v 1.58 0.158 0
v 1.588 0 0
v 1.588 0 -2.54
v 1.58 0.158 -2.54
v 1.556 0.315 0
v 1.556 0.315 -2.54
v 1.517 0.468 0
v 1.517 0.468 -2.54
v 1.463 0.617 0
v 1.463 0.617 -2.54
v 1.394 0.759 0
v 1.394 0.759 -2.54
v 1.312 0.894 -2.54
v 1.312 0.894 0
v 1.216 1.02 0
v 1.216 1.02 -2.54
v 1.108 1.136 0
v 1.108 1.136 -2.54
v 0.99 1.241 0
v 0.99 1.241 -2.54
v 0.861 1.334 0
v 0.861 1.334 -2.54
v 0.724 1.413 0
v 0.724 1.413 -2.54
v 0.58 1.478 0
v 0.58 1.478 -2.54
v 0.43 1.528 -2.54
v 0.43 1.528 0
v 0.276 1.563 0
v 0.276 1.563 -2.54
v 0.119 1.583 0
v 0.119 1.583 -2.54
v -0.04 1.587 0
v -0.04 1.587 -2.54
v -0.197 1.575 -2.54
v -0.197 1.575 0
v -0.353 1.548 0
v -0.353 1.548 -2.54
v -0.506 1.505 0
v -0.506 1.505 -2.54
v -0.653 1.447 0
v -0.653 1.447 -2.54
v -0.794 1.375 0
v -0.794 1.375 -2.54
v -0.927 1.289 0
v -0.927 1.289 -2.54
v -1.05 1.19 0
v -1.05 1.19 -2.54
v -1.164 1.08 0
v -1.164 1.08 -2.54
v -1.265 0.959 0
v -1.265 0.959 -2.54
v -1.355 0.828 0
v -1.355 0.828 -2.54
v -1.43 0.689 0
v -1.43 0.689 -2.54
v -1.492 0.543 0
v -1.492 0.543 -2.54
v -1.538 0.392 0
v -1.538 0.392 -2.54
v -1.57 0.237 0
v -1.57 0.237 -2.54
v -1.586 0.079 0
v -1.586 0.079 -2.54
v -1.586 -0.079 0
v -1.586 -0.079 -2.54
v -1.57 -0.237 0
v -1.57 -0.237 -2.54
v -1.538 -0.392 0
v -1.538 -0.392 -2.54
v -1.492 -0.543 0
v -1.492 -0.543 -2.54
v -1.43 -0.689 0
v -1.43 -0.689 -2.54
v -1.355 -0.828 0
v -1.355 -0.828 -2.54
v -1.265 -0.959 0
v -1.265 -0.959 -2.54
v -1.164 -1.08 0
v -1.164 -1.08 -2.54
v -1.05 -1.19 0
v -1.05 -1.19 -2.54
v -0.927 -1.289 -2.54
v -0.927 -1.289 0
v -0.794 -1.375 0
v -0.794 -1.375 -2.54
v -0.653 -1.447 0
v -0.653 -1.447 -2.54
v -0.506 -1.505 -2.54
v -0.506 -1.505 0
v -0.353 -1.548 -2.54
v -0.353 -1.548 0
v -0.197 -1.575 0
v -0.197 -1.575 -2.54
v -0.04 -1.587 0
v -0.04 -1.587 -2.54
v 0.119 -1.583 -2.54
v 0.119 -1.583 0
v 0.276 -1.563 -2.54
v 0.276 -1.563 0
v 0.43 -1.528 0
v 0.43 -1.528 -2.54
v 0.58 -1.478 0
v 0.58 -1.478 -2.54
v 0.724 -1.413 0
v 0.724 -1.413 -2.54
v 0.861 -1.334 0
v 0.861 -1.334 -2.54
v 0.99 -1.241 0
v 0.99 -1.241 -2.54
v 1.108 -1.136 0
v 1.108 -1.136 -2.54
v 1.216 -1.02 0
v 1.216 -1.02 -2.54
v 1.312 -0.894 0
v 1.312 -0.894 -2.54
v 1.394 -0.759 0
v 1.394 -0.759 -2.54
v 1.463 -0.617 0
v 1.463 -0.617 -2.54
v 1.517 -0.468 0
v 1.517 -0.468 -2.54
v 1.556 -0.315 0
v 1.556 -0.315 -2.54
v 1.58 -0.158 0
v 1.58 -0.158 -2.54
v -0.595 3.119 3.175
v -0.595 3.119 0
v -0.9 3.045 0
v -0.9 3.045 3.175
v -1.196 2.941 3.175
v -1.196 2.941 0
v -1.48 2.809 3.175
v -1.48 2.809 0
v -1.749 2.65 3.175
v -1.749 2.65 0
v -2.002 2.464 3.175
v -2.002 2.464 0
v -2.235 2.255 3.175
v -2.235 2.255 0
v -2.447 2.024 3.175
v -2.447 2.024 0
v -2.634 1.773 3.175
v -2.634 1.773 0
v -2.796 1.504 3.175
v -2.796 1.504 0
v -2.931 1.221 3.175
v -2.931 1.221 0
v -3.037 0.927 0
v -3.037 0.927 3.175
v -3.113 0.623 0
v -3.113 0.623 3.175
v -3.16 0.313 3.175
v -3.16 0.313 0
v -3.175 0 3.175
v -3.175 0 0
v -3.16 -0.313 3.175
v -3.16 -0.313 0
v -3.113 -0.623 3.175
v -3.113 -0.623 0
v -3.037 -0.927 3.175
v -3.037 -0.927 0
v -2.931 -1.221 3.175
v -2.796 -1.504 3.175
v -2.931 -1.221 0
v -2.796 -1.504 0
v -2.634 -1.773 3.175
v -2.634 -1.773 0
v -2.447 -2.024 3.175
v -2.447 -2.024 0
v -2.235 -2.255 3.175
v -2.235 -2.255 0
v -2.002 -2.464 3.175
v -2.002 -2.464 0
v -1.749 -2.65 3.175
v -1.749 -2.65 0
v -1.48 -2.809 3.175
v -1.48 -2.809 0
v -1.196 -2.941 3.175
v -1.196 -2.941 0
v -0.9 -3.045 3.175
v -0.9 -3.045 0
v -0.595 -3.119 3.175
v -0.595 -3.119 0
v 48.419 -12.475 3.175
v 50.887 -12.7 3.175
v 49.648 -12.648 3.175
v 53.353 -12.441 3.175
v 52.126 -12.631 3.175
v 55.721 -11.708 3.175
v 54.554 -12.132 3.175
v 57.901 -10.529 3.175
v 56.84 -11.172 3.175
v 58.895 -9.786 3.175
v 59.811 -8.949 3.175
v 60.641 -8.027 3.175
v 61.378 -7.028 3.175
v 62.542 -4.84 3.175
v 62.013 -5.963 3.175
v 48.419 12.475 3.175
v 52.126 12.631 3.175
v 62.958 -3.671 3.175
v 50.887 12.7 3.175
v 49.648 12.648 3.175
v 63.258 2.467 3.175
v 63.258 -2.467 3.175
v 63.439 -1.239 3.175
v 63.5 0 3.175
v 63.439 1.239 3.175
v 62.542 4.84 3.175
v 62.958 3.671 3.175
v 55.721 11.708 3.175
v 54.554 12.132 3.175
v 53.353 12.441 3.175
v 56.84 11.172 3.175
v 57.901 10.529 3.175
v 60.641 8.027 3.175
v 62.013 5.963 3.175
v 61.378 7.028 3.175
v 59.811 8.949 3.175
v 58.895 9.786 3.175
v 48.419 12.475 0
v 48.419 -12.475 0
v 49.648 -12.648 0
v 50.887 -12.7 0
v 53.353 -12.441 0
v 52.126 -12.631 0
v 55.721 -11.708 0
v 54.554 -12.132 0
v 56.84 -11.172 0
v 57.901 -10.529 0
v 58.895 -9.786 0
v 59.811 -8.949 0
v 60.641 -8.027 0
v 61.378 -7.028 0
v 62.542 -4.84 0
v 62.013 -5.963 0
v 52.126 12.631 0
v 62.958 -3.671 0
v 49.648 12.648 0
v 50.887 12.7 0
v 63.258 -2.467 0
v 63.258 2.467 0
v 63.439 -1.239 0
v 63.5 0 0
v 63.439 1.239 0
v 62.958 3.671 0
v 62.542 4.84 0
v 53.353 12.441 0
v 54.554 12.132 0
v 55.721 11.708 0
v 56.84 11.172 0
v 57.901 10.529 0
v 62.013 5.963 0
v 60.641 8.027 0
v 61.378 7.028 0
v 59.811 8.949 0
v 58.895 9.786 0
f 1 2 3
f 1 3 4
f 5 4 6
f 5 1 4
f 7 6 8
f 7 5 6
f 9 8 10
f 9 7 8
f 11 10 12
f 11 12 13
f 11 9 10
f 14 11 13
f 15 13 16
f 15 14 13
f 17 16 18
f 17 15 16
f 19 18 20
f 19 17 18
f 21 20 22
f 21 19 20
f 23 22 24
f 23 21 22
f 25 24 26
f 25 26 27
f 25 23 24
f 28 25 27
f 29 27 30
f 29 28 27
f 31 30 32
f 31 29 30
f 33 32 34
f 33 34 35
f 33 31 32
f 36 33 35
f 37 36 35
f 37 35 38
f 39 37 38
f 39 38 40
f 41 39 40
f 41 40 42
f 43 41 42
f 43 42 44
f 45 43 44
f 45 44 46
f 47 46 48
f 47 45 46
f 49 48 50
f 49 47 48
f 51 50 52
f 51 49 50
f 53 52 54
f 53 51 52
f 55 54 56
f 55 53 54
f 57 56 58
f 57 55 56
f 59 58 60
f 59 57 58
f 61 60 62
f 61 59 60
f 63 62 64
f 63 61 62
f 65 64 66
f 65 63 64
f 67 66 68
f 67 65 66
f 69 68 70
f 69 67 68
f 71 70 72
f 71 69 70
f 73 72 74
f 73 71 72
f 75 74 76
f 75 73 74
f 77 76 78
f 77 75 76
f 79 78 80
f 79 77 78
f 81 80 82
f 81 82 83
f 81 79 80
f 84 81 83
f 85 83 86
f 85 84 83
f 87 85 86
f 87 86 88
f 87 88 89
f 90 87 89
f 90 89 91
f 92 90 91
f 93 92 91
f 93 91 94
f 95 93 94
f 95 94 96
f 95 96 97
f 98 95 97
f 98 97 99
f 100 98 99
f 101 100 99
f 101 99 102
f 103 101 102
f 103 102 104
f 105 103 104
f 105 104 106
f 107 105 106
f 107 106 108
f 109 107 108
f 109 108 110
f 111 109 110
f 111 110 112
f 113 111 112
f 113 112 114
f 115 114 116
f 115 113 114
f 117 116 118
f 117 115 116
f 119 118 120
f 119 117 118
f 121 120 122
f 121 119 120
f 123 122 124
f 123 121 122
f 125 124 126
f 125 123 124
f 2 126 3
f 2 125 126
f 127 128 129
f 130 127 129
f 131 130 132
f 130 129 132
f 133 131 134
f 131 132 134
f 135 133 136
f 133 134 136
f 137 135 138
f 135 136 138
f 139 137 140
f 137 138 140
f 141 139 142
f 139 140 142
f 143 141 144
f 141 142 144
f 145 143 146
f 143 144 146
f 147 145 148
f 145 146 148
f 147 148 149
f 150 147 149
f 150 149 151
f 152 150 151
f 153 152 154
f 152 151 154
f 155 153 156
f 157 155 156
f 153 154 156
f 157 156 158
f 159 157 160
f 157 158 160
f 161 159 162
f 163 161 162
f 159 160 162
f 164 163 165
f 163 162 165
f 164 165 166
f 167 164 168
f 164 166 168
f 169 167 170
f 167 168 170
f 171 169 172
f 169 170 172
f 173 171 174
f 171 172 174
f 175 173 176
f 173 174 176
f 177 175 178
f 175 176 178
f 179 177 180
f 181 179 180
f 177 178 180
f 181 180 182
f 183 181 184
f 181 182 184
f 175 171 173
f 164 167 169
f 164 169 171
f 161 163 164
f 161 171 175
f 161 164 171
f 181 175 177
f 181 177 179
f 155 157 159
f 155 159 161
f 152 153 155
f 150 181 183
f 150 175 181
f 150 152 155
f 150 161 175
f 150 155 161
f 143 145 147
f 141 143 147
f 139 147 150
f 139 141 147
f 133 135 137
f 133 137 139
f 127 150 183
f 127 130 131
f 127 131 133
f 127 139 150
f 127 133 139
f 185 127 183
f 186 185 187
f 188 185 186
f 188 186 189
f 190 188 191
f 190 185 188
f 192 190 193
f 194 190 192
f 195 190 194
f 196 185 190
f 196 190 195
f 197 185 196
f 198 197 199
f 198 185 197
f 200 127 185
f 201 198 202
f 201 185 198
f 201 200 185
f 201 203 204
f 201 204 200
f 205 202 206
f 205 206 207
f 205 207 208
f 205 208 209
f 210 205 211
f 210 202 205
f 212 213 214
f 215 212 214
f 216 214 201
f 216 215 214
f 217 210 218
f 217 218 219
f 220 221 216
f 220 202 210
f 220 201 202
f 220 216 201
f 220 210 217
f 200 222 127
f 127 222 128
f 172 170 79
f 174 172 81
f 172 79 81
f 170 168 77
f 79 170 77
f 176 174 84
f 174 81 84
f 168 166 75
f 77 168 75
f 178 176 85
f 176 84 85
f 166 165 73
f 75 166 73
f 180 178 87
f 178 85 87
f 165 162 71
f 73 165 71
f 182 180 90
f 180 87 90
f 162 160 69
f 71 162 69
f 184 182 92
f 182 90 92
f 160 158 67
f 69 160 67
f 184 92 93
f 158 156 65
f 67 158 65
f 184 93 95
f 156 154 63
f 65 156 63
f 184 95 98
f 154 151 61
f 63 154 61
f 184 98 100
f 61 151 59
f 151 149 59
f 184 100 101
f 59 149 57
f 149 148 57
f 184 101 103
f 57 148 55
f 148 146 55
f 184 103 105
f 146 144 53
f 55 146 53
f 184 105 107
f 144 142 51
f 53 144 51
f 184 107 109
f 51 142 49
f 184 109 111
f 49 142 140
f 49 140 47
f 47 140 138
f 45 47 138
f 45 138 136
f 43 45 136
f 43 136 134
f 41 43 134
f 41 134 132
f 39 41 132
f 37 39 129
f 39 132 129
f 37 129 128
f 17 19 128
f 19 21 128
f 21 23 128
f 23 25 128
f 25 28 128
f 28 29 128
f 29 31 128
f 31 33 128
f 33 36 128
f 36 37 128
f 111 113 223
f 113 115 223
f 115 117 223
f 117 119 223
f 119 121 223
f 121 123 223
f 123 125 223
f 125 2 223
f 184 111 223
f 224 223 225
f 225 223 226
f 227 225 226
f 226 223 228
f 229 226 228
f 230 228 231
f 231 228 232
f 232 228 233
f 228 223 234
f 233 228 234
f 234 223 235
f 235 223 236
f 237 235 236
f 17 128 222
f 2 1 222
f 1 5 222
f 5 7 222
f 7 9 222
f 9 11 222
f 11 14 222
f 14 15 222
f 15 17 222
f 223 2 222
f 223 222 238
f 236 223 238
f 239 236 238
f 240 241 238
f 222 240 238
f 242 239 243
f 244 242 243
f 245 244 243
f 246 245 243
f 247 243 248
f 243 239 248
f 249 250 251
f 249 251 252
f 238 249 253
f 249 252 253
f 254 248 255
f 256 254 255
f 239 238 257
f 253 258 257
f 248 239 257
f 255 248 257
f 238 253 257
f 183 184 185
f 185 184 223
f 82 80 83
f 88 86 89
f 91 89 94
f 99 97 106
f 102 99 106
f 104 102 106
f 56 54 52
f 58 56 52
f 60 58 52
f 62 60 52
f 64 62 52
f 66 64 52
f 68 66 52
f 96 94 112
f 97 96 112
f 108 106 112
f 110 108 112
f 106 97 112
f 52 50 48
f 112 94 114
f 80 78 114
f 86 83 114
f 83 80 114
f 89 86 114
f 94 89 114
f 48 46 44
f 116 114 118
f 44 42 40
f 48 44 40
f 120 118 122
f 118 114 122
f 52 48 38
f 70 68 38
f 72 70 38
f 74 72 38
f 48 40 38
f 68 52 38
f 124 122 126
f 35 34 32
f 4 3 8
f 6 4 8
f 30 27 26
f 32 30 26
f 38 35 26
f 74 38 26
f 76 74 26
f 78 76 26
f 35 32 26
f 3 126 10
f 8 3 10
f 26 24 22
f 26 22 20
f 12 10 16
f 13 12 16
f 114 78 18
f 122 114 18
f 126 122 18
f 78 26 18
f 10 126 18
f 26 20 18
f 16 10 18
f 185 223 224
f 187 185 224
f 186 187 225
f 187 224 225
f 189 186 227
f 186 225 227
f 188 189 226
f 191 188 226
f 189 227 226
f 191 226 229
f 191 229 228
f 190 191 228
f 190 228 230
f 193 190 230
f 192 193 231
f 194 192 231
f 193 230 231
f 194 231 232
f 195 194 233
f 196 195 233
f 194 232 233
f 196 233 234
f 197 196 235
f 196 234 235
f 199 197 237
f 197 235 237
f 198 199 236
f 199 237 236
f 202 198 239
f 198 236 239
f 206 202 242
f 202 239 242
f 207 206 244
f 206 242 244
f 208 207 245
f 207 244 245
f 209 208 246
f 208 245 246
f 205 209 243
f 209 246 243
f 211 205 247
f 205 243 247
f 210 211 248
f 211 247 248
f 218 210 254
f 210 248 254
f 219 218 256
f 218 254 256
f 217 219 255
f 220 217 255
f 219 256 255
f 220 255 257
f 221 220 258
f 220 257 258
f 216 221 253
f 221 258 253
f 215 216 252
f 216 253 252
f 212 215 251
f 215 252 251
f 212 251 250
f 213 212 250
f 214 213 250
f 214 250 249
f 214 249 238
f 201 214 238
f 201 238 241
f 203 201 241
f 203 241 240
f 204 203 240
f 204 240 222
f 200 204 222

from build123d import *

# Parameters (mm, degrees)
F0_R     = 1.5875
F1_DEPTH = 3.175
F2_DEPTH = 2.54


with BuildPart() as f1:
    # F0 (on Top) → F1 (new body)
    with BuildSketch(Plane.XY):
        with BuildLine():
            Line((48.41875, 12.47476), (-0.595312, 3.11869))
            ThreePointArc((-0.595312, 3.11869), (-3.175, 0), (-0.595312, -3.11869))
            Line((-0.595312, -3.11869), (48.41875, -12.47476))
            ThreePointArc((48.41875, -12.47476), (63.5, 0), (48.41875, 12.47476))
        make_face()
        Circle(F0_R, mode=Mode.SUBTRACT)
        Circle(F0_R)
    extrude(amount=F1_DEPTH)

    # F0 (on Top) → F2 (join)
    with BuildSketch(Plane.XY):
        Circle(F0_R)
    extrude(amount=-F2_DEPTH)


solid = f1.part
